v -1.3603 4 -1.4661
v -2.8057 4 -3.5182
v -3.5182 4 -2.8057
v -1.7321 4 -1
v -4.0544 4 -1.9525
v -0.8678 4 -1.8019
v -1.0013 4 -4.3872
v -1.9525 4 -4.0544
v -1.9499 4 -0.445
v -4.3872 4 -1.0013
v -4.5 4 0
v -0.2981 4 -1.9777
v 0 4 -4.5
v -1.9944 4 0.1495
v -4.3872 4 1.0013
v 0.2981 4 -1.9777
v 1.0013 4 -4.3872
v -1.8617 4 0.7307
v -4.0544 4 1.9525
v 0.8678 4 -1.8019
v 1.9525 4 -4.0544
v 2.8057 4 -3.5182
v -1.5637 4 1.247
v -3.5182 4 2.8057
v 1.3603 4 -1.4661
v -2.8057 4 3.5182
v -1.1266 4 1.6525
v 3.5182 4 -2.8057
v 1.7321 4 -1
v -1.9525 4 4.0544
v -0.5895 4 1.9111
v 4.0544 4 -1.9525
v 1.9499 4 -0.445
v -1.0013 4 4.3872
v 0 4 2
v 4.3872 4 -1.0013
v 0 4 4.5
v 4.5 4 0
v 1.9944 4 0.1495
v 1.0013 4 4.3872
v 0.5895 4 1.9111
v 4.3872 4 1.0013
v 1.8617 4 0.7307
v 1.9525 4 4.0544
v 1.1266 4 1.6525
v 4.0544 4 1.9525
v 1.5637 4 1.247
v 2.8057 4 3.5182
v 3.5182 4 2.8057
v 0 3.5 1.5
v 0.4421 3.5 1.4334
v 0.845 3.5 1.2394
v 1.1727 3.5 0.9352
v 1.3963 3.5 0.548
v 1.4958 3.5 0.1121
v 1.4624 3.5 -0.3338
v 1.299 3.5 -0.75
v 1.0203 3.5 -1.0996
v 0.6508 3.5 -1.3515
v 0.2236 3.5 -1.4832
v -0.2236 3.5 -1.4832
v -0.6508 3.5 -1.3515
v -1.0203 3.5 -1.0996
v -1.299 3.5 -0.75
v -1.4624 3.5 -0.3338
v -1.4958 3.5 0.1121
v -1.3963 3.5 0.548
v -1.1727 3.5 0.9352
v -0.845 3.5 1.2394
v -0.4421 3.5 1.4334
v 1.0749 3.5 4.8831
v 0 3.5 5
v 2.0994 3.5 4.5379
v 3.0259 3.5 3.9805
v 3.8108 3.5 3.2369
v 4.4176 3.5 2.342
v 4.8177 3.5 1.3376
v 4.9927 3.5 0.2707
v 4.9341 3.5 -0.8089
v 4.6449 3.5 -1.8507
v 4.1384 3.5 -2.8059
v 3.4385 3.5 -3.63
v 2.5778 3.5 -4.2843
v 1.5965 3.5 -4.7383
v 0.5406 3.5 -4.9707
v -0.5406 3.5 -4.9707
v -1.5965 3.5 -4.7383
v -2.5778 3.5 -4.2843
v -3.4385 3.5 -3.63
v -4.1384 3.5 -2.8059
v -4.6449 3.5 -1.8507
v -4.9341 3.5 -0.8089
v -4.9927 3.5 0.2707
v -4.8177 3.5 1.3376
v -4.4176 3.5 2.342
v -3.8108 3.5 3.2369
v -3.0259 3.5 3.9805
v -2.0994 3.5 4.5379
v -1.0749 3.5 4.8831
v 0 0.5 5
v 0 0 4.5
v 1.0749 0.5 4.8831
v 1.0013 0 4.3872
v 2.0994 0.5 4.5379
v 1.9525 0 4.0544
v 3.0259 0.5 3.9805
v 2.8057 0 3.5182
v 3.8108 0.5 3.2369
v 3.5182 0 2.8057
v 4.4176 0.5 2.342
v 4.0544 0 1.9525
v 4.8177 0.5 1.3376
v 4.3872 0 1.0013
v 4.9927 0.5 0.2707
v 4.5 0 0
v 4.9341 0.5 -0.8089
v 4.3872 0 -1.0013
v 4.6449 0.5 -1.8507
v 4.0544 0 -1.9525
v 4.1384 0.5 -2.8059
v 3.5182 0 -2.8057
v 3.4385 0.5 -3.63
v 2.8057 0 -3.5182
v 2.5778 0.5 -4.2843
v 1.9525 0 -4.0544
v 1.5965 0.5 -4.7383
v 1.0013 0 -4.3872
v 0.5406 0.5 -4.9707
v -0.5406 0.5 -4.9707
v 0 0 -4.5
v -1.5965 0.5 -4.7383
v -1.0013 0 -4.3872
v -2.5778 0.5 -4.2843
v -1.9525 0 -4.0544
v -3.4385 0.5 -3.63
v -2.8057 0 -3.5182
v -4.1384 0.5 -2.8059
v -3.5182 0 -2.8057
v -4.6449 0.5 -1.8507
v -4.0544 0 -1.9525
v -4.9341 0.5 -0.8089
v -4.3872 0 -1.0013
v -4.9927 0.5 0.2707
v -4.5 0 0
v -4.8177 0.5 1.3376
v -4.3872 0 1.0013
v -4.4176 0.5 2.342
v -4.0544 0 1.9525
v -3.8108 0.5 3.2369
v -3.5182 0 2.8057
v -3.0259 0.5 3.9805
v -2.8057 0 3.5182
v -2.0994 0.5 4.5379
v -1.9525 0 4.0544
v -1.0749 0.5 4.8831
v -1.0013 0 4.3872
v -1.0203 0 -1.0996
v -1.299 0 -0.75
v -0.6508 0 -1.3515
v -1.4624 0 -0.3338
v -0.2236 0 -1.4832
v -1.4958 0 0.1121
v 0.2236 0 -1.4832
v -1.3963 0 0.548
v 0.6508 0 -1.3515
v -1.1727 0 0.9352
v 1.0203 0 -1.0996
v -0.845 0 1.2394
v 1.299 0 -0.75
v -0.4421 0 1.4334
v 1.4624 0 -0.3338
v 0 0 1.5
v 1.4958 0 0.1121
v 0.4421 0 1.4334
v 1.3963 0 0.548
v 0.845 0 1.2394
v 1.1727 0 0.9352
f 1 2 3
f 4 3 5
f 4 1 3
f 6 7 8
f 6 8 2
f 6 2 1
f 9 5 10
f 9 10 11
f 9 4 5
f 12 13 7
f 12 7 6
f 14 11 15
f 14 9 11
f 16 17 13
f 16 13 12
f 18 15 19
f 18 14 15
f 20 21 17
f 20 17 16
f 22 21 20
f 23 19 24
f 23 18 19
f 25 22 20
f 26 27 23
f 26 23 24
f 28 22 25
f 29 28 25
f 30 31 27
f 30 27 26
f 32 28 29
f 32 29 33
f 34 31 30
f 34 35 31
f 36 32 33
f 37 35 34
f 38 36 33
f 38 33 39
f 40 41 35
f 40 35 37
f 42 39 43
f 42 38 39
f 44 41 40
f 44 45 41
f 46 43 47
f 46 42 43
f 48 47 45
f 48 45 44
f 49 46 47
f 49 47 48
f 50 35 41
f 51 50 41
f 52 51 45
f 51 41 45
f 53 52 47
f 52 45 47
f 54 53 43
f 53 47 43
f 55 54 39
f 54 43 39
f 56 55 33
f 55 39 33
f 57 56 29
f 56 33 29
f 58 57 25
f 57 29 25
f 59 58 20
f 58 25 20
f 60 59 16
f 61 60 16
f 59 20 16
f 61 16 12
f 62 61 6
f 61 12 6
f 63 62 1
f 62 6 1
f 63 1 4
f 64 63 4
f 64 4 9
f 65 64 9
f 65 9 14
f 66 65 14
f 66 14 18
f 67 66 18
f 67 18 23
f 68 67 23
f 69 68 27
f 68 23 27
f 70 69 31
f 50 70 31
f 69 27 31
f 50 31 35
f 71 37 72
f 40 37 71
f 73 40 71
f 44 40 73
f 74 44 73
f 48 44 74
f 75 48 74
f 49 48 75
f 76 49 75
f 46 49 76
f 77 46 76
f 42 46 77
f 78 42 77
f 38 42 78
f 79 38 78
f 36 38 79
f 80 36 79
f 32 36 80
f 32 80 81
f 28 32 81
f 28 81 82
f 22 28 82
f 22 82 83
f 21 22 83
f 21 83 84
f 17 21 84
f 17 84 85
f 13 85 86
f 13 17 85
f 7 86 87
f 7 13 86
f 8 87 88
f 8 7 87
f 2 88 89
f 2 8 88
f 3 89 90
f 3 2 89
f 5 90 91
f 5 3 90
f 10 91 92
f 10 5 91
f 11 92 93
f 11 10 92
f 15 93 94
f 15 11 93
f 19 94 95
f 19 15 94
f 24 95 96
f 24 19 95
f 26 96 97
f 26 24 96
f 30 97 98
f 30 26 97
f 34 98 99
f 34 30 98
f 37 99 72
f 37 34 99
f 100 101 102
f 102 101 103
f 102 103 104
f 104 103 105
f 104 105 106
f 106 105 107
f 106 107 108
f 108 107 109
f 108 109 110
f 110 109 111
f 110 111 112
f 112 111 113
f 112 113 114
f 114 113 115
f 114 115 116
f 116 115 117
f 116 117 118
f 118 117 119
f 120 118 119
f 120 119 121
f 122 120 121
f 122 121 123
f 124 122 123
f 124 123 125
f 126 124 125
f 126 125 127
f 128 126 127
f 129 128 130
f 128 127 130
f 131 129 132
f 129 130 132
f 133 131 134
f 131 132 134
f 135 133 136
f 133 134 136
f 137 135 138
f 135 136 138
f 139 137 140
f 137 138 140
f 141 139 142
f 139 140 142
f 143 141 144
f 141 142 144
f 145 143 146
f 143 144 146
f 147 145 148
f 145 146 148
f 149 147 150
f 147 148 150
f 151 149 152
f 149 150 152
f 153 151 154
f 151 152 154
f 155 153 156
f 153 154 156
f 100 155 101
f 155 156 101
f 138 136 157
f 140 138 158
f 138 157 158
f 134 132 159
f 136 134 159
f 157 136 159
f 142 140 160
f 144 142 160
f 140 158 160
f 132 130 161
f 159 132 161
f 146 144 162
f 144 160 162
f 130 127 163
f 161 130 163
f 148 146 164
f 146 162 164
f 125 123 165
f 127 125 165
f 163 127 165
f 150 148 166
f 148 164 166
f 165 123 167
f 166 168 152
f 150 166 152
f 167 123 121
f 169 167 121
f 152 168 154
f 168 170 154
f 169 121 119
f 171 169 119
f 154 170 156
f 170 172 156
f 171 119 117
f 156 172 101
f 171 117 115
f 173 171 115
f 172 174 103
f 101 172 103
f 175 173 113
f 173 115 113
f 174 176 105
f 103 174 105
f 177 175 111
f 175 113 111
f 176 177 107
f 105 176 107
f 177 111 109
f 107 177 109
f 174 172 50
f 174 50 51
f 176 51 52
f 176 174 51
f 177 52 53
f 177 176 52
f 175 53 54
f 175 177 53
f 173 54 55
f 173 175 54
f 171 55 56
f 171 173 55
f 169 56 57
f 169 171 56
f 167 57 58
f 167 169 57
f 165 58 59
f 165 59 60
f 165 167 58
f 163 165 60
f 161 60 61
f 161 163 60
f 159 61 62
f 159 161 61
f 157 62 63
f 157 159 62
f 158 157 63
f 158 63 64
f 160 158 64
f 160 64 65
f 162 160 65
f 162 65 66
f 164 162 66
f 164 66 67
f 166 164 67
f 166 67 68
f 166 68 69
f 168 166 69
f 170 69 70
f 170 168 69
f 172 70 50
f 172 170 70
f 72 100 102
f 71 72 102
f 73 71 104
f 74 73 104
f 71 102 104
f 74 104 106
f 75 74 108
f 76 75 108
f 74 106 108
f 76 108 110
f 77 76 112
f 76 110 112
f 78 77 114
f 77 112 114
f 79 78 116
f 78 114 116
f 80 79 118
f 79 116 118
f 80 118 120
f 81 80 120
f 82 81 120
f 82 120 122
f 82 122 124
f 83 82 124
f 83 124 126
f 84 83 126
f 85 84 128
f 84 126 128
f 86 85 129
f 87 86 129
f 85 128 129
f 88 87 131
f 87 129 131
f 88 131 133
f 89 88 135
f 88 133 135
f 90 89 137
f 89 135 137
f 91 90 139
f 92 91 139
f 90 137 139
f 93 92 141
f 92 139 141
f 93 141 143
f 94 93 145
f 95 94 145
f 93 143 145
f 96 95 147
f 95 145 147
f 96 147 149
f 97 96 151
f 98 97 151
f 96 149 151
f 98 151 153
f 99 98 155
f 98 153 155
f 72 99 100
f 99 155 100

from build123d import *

# Parameters (mm, degrees)
SKETCH_1_R      = 5
SKETCH_1_R_2    = 1.5
EXTRUDE_1_DEPTH = 4
CHAMFER_1_SIZE  = 0.5


with BuildPart() as part:
    # 草图1 → 凸台-拉伸1 (new body)
    with BuildSketch(Plane(origin=(0, 0, 0), x_dir=(1, 0, 0), z_dir=(0, 1, 0))):
        with Locations(Location((0, 0, 0), (0, 0, 270))):
            Circle(SKETCH_1_R)
        with Locations(Location((0, 0, 0), (0, 0, 270))):
            Circle(SKETCH_1_R_2, mode=Mode.SUBTRACT)
    extrude(amount=EXTRUDE_1_DEPTH)

    # 倒角1
    chamfer_1_edges = [part.edges().sort_by_distance(p)[0] for p in [
        (0, 0, -5),
        (0, 4, -5),
        (0, 4, -1.5),
    ]]
    chamfer(chamfer_1_edges, length=CHAMFER_1_SIZE)


solid = part.part
